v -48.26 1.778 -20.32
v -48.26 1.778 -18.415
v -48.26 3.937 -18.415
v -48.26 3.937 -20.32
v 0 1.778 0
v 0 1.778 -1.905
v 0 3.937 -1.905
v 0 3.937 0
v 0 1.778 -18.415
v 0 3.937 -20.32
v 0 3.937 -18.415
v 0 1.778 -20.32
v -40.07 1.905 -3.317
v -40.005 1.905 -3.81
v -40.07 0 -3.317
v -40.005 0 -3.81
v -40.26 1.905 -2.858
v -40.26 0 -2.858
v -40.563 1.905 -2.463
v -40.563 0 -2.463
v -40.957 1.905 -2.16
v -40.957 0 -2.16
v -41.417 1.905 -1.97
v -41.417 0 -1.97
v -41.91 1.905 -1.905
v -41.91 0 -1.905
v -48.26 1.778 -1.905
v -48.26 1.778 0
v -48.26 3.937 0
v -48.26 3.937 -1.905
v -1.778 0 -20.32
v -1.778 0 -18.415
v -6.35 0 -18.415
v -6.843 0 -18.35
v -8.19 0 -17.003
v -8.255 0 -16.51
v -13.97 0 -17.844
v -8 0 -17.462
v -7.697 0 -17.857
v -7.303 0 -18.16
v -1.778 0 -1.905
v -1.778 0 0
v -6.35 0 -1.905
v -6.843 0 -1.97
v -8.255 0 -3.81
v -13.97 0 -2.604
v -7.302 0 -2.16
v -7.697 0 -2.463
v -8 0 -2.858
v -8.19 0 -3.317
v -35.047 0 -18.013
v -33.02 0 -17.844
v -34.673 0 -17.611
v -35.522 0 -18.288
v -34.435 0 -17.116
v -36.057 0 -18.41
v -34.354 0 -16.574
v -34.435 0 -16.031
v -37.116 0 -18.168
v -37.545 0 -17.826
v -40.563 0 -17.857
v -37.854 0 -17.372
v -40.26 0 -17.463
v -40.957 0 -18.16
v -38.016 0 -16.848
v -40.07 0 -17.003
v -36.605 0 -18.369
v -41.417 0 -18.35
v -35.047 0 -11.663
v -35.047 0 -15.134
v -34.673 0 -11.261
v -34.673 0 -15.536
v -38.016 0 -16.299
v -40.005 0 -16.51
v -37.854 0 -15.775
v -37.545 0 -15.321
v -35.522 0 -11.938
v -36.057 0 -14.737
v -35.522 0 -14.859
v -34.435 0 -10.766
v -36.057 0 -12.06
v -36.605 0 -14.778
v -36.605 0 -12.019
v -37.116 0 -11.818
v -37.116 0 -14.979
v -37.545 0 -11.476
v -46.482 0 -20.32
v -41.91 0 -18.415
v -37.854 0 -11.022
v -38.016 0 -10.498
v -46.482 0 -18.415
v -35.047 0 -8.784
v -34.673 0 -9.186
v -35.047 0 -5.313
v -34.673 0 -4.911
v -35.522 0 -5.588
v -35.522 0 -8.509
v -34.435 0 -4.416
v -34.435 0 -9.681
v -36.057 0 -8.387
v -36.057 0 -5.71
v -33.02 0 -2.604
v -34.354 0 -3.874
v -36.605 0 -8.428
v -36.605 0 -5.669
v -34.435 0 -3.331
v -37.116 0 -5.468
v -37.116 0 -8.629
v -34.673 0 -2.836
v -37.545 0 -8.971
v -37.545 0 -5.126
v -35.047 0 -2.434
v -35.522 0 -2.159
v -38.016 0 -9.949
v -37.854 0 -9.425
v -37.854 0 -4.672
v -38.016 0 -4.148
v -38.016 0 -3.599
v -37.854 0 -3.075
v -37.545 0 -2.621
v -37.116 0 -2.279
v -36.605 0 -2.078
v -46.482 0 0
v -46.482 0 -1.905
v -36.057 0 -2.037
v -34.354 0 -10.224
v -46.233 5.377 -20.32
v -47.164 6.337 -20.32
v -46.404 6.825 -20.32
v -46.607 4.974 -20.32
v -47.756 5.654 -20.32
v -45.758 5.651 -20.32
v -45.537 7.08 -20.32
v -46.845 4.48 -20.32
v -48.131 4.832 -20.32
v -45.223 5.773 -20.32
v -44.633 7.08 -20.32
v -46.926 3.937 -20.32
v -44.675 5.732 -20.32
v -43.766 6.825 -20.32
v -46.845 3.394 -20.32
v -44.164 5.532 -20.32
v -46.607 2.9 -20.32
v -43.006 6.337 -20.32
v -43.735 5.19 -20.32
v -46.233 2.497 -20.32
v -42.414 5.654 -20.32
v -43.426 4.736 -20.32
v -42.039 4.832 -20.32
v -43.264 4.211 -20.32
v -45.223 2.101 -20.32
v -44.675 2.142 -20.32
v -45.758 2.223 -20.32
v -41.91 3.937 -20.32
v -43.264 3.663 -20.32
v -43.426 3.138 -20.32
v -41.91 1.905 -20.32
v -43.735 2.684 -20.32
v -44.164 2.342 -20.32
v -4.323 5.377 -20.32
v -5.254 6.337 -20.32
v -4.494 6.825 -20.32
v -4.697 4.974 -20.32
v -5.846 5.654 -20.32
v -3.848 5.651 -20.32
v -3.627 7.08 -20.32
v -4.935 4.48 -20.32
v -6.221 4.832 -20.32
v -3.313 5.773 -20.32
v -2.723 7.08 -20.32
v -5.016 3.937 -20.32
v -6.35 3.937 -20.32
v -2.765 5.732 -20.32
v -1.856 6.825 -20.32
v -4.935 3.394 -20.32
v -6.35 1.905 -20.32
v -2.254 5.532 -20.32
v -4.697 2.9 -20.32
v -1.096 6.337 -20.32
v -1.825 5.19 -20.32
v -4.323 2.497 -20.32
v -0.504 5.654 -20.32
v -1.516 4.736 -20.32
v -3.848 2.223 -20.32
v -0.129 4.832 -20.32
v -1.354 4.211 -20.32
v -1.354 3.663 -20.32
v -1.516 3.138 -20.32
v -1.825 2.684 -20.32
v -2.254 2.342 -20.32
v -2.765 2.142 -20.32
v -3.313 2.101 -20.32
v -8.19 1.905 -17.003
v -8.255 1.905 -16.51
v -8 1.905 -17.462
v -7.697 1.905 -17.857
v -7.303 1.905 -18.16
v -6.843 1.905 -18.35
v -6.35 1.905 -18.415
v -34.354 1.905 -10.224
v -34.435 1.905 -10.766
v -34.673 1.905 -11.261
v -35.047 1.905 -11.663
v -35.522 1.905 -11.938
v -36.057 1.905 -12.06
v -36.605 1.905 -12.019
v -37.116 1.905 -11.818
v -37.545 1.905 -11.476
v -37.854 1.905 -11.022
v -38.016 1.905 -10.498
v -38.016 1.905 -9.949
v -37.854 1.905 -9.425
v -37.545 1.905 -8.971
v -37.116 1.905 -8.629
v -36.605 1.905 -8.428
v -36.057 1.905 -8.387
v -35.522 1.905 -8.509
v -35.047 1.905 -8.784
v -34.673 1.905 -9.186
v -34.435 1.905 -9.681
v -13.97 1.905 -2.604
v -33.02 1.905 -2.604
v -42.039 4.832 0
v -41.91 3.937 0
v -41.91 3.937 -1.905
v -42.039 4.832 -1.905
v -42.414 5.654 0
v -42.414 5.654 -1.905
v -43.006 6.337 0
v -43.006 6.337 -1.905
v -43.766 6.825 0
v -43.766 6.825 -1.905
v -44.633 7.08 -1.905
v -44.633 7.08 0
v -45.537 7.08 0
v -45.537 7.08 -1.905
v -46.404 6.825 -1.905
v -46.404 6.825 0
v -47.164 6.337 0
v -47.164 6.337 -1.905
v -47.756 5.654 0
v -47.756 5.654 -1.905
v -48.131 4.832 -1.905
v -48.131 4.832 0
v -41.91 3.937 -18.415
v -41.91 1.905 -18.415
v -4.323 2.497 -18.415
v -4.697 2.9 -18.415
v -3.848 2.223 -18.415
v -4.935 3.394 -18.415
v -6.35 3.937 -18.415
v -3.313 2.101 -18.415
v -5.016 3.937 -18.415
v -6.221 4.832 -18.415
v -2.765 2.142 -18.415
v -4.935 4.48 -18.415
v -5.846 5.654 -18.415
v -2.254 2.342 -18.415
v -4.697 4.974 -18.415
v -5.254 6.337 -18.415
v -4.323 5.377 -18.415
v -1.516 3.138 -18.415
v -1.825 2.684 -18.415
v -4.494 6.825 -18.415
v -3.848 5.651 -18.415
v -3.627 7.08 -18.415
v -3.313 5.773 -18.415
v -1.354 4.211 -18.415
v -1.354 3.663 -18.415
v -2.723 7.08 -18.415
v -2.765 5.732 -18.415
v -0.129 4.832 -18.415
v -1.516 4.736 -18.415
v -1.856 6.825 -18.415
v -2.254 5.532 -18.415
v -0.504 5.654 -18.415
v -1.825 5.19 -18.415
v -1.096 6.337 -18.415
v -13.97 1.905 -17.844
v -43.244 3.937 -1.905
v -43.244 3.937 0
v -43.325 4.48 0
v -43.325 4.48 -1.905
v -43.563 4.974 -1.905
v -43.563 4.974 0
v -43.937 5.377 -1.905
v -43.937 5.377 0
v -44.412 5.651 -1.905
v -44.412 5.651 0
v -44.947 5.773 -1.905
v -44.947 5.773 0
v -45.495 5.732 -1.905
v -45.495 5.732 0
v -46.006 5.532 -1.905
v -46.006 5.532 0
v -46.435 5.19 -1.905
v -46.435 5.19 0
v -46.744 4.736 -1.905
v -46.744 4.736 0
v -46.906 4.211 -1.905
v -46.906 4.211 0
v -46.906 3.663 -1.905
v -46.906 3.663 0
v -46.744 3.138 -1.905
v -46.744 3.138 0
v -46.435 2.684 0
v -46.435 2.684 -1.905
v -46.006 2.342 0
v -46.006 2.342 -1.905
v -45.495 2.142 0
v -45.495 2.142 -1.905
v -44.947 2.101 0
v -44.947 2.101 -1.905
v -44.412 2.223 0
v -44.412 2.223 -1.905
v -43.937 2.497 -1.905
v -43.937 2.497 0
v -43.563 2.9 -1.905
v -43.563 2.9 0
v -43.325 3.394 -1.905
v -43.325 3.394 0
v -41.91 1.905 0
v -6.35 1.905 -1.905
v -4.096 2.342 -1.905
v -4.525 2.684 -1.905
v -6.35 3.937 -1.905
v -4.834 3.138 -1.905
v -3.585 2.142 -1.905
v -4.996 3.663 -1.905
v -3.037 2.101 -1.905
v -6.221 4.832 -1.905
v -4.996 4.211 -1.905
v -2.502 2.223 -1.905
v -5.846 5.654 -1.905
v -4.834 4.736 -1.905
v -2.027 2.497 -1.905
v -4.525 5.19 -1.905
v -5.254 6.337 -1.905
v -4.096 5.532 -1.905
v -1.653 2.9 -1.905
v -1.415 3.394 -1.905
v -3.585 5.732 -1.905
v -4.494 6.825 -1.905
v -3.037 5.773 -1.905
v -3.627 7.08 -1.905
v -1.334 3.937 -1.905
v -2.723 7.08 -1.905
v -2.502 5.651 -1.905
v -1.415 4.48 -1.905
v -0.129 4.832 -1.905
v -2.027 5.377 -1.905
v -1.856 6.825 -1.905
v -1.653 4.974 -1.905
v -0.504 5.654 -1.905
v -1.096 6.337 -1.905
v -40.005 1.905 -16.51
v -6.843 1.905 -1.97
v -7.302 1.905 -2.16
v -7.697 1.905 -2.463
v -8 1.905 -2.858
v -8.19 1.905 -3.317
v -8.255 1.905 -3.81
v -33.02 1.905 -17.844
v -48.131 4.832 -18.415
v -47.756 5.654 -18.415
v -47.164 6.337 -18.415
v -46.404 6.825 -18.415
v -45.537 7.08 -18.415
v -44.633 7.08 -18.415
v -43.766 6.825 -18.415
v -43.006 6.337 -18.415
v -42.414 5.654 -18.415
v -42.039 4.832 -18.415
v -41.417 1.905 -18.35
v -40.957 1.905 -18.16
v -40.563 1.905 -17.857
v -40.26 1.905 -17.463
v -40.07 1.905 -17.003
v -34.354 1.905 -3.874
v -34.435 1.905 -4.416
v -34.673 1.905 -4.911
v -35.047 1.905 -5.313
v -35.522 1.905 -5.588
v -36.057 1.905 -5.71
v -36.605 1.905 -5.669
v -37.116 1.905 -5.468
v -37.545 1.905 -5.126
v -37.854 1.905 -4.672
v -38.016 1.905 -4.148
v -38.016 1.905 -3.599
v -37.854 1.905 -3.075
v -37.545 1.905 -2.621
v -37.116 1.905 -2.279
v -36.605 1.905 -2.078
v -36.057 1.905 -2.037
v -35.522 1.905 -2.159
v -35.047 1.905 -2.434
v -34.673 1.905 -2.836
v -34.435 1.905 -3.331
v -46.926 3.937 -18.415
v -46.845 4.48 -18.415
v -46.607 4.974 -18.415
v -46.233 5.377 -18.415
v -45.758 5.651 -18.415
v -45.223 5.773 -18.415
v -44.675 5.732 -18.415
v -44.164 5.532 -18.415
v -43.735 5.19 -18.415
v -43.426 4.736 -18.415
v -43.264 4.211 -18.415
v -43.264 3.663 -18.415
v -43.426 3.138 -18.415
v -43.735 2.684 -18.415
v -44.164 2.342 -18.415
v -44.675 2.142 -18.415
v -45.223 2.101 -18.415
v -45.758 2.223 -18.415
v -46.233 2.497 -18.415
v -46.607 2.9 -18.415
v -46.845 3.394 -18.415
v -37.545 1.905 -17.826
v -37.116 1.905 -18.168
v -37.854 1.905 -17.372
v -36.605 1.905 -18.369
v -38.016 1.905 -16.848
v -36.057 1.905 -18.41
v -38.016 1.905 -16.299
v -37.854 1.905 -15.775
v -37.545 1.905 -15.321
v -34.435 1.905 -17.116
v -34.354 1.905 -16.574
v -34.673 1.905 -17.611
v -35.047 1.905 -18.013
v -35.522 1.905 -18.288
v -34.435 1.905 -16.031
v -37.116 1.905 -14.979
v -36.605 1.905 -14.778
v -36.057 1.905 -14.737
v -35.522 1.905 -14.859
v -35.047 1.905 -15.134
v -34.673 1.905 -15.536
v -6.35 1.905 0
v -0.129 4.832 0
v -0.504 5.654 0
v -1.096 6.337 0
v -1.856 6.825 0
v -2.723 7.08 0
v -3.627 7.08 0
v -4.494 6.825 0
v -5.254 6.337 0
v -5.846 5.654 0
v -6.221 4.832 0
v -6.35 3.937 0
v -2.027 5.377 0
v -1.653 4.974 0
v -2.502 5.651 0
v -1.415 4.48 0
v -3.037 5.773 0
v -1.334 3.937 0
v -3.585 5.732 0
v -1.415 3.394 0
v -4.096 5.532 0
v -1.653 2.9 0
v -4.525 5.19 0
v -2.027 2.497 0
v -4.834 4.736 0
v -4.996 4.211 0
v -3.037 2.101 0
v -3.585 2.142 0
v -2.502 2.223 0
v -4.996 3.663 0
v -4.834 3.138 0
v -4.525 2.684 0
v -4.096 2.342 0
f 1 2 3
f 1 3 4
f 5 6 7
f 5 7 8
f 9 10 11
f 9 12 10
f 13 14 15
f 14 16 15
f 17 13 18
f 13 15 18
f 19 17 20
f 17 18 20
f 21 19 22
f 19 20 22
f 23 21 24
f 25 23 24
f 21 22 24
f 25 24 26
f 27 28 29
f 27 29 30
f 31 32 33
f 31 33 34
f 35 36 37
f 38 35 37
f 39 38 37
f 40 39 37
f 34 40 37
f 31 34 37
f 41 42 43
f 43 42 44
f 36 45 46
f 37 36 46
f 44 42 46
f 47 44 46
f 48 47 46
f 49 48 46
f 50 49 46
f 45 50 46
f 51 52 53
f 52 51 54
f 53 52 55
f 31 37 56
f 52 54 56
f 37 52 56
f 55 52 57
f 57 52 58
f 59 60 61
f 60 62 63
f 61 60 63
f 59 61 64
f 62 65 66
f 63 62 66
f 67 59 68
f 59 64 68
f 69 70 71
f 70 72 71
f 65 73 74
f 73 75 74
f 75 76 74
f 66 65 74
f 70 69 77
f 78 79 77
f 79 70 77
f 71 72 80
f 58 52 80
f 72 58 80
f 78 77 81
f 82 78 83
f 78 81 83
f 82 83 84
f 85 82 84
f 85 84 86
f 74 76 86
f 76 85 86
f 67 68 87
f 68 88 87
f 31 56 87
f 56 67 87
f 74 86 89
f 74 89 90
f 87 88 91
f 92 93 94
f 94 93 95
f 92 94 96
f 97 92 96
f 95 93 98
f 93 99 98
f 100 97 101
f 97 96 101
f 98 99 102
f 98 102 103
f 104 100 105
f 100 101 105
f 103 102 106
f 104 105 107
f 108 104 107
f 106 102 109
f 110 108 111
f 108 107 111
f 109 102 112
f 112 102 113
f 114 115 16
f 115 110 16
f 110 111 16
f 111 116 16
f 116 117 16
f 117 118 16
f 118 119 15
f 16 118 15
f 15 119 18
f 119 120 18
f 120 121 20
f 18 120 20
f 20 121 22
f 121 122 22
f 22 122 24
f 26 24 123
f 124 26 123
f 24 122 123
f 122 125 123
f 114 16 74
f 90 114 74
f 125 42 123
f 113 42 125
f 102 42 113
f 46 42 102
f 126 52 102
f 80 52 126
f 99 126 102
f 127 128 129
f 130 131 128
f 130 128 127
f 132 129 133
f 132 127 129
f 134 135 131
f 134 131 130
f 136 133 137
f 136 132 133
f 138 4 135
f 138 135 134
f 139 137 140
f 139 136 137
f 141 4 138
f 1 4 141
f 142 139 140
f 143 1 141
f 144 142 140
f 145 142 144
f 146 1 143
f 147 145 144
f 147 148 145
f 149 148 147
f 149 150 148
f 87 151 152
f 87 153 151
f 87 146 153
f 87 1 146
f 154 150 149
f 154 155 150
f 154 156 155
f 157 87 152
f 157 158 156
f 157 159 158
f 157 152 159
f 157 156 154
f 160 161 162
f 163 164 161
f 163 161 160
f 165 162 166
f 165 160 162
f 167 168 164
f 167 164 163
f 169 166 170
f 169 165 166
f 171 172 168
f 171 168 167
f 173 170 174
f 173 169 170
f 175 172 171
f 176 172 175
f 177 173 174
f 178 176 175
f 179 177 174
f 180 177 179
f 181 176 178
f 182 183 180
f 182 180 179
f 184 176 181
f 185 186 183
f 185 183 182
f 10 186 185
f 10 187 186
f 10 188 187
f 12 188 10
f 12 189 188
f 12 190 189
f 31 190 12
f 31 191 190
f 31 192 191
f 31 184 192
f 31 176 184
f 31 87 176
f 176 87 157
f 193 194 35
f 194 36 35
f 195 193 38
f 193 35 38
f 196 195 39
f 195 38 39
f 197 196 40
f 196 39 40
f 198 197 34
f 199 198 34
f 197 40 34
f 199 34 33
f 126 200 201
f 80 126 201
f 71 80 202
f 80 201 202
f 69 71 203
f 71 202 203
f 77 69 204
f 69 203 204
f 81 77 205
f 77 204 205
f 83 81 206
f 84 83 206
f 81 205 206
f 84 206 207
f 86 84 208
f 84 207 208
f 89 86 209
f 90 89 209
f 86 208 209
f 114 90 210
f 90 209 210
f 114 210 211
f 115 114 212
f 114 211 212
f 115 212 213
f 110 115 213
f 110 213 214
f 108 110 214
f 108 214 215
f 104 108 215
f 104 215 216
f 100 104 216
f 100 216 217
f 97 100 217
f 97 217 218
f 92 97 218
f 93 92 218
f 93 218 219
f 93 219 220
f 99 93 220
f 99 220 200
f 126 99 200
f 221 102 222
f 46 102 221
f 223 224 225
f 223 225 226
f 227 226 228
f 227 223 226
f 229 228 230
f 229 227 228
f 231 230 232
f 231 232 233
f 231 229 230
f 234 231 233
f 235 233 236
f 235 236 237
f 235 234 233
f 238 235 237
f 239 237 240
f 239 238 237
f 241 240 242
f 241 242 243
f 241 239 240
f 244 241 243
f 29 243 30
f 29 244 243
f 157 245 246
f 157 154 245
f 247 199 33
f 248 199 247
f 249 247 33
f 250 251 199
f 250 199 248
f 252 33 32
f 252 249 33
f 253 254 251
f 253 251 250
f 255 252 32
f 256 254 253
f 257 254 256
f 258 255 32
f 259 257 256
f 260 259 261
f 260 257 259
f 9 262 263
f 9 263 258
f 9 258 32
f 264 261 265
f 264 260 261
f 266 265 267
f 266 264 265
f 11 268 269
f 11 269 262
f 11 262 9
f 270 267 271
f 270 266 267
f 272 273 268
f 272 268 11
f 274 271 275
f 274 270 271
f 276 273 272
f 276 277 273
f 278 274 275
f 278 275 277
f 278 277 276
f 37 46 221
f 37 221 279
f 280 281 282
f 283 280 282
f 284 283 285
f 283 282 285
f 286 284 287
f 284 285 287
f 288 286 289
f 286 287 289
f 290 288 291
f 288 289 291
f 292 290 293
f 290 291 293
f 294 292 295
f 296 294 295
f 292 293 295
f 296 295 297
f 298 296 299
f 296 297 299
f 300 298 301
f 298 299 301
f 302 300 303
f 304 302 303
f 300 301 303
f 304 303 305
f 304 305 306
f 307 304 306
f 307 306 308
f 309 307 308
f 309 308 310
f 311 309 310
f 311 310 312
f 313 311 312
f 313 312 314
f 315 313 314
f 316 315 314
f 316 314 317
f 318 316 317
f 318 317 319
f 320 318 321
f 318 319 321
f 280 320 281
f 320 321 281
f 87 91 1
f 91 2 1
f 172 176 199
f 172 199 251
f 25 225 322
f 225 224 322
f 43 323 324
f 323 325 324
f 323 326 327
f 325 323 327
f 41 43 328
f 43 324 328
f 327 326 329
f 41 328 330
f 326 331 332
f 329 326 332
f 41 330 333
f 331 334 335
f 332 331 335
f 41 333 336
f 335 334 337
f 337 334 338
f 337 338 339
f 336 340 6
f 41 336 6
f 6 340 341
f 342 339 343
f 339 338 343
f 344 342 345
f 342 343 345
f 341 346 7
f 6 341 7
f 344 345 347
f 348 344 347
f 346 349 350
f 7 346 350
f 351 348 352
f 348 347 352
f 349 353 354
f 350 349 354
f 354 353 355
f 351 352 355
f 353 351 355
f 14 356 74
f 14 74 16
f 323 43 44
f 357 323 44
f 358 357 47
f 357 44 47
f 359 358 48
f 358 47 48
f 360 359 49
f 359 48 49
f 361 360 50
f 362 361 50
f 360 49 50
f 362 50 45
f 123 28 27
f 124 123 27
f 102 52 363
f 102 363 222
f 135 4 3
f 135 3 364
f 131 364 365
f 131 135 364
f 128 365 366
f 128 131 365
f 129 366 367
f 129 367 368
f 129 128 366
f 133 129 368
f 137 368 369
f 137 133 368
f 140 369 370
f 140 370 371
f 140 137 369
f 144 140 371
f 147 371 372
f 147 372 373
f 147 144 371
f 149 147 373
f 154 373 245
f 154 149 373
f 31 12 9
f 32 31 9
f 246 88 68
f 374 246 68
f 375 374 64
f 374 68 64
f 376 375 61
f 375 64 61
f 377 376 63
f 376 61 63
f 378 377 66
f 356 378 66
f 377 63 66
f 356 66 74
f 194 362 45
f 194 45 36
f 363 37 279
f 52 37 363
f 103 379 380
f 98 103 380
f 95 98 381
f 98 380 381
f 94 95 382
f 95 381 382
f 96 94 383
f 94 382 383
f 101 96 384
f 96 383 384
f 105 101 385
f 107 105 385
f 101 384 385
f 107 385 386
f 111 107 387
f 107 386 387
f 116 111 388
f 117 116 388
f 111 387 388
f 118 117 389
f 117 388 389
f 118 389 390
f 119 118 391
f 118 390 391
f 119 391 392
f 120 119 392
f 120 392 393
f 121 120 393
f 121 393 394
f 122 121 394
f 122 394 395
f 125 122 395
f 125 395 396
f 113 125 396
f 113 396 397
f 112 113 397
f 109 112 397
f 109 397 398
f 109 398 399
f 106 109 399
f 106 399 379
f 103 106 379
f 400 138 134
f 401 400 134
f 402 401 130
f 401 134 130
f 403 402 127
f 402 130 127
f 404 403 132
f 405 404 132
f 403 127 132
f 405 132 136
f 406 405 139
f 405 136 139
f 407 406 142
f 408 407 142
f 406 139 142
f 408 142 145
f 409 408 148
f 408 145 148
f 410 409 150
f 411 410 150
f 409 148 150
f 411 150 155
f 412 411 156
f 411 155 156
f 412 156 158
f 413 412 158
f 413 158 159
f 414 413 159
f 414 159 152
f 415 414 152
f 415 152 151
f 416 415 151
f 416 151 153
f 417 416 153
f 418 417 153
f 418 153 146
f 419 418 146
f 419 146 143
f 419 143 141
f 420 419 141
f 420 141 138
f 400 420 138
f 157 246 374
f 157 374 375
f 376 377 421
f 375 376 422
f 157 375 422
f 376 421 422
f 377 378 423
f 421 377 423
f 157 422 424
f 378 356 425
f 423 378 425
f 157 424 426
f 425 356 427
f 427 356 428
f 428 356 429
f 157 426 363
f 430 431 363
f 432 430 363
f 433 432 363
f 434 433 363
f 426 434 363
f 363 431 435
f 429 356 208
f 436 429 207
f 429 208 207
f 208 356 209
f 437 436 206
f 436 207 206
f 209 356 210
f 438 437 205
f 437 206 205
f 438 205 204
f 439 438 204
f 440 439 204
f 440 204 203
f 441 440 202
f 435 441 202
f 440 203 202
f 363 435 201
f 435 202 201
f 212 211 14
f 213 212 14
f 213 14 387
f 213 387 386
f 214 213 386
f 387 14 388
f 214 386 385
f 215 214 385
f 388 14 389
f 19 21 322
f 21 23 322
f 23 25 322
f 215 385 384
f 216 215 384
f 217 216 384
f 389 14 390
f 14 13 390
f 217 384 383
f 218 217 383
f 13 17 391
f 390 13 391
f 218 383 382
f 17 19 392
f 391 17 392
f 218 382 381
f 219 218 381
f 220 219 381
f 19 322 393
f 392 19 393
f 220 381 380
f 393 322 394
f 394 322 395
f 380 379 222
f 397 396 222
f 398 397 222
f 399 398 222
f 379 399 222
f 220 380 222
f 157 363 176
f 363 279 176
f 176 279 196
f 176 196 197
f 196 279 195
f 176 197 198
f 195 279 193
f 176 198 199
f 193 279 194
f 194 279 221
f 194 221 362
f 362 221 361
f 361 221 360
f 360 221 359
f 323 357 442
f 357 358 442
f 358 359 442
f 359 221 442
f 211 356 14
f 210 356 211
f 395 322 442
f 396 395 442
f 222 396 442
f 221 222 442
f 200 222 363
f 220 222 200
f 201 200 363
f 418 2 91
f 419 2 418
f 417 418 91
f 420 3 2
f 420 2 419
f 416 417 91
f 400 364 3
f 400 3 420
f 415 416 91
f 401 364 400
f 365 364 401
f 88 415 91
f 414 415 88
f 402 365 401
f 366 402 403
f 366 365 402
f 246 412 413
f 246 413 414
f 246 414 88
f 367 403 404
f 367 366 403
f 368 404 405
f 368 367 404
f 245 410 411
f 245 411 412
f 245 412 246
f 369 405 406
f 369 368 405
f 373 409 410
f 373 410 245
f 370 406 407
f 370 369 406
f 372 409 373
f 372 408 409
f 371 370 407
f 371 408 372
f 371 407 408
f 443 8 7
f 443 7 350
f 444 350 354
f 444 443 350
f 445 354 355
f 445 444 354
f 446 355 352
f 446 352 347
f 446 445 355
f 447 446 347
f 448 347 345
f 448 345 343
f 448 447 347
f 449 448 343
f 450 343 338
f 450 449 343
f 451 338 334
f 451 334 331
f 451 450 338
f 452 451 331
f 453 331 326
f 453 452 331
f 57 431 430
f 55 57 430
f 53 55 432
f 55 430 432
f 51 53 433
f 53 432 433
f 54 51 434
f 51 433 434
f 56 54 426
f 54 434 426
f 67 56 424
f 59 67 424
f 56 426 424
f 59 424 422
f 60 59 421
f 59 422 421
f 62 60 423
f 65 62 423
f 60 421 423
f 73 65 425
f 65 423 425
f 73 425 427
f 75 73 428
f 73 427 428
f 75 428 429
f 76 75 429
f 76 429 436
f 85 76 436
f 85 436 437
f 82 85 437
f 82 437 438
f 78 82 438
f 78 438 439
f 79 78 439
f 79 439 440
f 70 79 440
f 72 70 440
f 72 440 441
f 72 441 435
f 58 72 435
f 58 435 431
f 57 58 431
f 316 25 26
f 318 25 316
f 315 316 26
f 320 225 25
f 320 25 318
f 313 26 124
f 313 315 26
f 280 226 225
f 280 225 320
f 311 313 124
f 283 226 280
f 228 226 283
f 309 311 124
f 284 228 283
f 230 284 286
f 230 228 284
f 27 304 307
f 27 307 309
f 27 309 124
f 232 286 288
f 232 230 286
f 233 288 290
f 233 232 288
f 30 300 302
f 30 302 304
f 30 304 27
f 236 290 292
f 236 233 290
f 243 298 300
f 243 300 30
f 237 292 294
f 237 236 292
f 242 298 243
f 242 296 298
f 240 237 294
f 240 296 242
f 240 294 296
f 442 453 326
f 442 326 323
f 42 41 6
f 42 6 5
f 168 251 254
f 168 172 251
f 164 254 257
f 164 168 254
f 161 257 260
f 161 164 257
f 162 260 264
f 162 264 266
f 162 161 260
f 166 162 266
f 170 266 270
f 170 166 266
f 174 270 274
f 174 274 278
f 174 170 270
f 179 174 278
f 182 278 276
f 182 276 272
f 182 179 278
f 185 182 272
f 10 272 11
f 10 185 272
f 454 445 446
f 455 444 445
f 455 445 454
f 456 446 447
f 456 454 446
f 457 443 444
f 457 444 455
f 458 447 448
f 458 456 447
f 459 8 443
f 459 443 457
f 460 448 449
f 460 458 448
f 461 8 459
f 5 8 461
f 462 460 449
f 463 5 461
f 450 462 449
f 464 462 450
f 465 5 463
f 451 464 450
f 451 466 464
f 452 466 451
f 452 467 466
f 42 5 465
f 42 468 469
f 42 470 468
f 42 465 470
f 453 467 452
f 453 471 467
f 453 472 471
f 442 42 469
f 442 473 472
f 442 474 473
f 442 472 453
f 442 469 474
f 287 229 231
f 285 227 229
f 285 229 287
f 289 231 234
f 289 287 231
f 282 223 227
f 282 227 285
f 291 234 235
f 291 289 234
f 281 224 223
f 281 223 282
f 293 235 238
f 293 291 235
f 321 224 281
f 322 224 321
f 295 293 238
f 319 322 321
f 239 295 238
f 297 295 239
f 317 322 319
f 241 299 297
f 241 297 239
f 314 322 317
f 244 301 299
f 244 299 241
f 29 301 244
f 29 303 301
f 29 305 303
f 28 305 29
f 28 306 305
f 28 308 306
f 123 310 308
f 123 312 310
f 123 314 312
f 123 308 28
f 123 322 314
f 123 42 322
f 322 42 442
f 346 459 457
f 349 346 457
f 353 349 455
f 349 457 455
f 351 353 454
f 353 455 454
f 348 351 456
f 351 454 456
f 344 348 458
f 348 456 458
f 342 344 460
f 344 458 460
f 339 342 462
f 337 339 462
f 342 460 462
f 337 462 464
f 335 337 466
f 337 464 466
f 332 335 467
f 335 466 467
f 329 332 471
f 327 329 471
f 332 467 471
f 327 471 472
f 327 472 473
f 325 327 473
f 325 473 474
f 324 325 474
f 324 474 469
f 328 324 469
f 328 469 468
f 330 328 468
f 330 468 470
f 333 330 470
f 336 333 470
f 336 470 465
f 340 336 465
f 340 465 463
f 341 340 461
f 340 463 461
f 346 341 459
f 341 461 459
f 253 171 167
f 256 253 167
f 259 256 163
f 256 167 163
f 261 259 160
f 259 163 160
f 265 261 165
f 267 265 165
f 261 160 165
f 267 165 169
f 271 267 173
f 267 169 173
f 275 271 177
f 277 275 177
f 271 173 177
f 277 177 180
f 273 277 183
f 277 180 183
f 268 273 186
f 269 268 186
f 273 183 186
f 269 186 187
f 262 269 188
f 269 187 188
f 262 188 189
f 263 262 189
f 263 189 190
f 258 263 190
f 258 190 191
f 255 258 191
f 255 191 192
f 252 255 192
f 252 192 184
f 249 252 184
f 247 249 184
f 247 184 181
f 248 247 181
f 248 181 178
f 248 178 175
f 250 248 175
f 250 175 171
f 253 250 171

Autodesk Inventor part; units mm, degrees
ref_plane "YZ Plane" through (0, 0, 0) normal (1, 0, 0) x (0, 1, 0)
ref_plane "XZ Plane" through (0, 0, 0) normal (0, 1, 0) x (-1, 0, 0)
ref_plane "XY Plane" through (0, 0, 0) normal (0, 0, 1) x (1, 0, 0)
sketch "Sketch1" plane through (0, 0, 0) normal (0, 1, 0) x (-1, 0, 0)
  line L0 (0, 0) -> (48.26, 0)
  line L1 (48.26, 0) -> (48.26, -20.32)
  line L2 (48.26, -20.32) -> (0, -20.32)
  line L3 (0, -20.32) -> (0, 0)
  line L4 (33.02, -2.6035) -> (13.97, -2.6035)
  line L5 (13.97, -2.6035) -> (13.97, -17.8435)
  line L6 (13.97, -17.8435) -> (33.02, -17.8435)
  line L7 (33.02, -17.8435) -> (33.02, -2.6035)
  dimension "d0" = 48.26
  dimension "d1" = 20.32
  dimension "d2" = 19.05
  dimension "d3" = 15.24
  dimension "d4" = 15.24
  dimension "d5" = 2.6035
extrude "Extrusion1" add sketch "Sketch1" along normal blind 1.905
sketch "Sketch2" plane through (-48.26, 0, 0) normal (0, 0, 1) x (1, 0, 0)
  line L0 (48.26, 0) -> (0, 0) projected
  line L1 (48.26, 0) -> (48.26, 1.905) projected
  line L2 (0, 1.905) -> (48.26, 1.905) projected
  line L3 (0, 0) -> (0, 1.905) projected
  circle A0 centre (3.175, 3.937) radius 1.8415
  circle A1 centre (45.085, 3.937) radius 1.8415
  circle A2 centre (3.175, 3.937) radius 3.175
  circle A3 centre (45.085, 3.937) radius 3.175
  line L4 (0, 1.905) -> (48.26, 1.905) projected
  line L5 (0, 0) -> (0, 1.905) projected
  line L6 (0, 3.937) -> (0, 1.905)
  line L7 (6.35, 3.937) -> (6.35, 1.905)
  line L8 (48.26, 1.905) -> (0, 1.905) projected
  line L9 (48.26, 3.937) -> (48.26, 1.905)
  line L10 (41.91, 3.937) -> (41.91, 1.905)
  dimension "d8" = 3.683
  dimension "d9" = 41.91
  dimension "d10" = 6.35
  dimension "d28" = 2.032
extrude "Extrusion2" add sketch "Sketch2" against normal blind 1.905
sketch "Sketch3" plane through (0, 0, -20.32) normal (0, 0, -1) x (-1, 0, 0)
  circle A0 centre (3.175, 3.937) radius 1.8415 projected
  arc A1 (6.35, 3.937) -> (0, 3.937) centre (3.175, 3.937) ccw projected
  line L0 (0, 3.937) -> (0, 1.905) projected
  line L1 (6.35, 1.905) -> (0, 1.905) projected
  line L2 (6.35, 1.905) -> (6.35, 3.937) projected
  circle A2 centre (45.085, 3.937) radius 1.8415 projected
  line L3 (48.26, 1.905) -> (41.91, 1.905) projected
  line L4 (48.26, 1.905) -> (48.26, 3.937) projected
  arc A3 (48.26, 3.937) -> (41.91, 3.937) centre (45.085, 3.937) ccw projected
  line L5 (41.91, 3.937) -> (41.91, 1.905) projected
  point P0 (0, 0)
extrude "Extrusion3" add sketch "Sketch3" against normal blind 1.905
sketch "Sketch4" plane through (0, 1.905, 0) normal (0, 1, 0) x (1, 0, 0)
  line L0 (-33.02, 2.6035) -> (-33.02, 17.8435) construction
  circle A0 centre (-36.195, 16.5735) radius 1.8415
  circle A1 centre (-36.195, 10.2235) radius 1.8415
  circle A2 centre (-36.195, 3.8735) radius 1.8415
  line L1 (-36.195, 16.5735) -> (-36.195, 10.2235) construction
  line L2 (-36.195, 10.2235) -> (-36.195, 3.8735) construction
  line L3 (-13.97, 2.6035) -> (-33.02, 2.6035) construction
  point P0 (0, 0)
  dimension "d18" = 3.683
  dimension "d19" = 3.175
  dimension "d20" = 6.35
  dimension "d21" = 1.27
extrude "Extrusion4" cut sketch "Sketch4" against normal through all
sketch "Sketch5" plane through (0, 1.905, 0) normal (0, 1, 0) x (1, 0, 0)
  line L0 (-48.26, 18.415) -> (-41.91, 18.415) projected
  line L1 (-41.91, 1.905) -> (-48.26, 1.905) projected
  line L2 (0, 1.905) -> (-6.35, 1.905) projected
  line L3 (-6.35, 18.415) -> (0, 18.415) projected
  line L4 (-41.91, 18.415) -> (-48.26, 18.415) projected
  line L5 (-48.26, 18.415) -> (-40.005, 18.415)
  line L6 (-40.005, 18.415) -> (-40.005, 1.905)
  line L7 (-40.005, 1.905) -> (-48.26, 1.905)
  line L8 (-48.26, 1.905) -> (-48.26, 18.415)
  line L9 (0, 1.905) -> (-8.255, 1.905)
  line L10 (-8.255, 1.905) -> (-8.255, 18.415)
  line L11 (-8.255, 18.415) -> (0, 18.415)
  line L12 (0, 18.415) -> (0, 1.905)
  point P0 (0, 0)
  dimension "d24" = 8.255
extrude "Extrusion5" cut sketch "Sketch5" against normal through all
fillet "Fillet1" radius 1.905 4 edges at (-40.005, 0.9525, -18.415) (-40.005, 0.9525, -1.905) (-8.255, 0.9525, -1.905) (-8.255, 0.9525, -18.415)
chamfer "Chamfer1" distance 1.778 angle 45 4 edges at (-48.26, 0, -19.3675) (-48.26, 0, -0.9525) (0, 0, -0.9525) (0, 0, -19.3675)
properties part number "RelayHolder" material "ABS Plastic"
